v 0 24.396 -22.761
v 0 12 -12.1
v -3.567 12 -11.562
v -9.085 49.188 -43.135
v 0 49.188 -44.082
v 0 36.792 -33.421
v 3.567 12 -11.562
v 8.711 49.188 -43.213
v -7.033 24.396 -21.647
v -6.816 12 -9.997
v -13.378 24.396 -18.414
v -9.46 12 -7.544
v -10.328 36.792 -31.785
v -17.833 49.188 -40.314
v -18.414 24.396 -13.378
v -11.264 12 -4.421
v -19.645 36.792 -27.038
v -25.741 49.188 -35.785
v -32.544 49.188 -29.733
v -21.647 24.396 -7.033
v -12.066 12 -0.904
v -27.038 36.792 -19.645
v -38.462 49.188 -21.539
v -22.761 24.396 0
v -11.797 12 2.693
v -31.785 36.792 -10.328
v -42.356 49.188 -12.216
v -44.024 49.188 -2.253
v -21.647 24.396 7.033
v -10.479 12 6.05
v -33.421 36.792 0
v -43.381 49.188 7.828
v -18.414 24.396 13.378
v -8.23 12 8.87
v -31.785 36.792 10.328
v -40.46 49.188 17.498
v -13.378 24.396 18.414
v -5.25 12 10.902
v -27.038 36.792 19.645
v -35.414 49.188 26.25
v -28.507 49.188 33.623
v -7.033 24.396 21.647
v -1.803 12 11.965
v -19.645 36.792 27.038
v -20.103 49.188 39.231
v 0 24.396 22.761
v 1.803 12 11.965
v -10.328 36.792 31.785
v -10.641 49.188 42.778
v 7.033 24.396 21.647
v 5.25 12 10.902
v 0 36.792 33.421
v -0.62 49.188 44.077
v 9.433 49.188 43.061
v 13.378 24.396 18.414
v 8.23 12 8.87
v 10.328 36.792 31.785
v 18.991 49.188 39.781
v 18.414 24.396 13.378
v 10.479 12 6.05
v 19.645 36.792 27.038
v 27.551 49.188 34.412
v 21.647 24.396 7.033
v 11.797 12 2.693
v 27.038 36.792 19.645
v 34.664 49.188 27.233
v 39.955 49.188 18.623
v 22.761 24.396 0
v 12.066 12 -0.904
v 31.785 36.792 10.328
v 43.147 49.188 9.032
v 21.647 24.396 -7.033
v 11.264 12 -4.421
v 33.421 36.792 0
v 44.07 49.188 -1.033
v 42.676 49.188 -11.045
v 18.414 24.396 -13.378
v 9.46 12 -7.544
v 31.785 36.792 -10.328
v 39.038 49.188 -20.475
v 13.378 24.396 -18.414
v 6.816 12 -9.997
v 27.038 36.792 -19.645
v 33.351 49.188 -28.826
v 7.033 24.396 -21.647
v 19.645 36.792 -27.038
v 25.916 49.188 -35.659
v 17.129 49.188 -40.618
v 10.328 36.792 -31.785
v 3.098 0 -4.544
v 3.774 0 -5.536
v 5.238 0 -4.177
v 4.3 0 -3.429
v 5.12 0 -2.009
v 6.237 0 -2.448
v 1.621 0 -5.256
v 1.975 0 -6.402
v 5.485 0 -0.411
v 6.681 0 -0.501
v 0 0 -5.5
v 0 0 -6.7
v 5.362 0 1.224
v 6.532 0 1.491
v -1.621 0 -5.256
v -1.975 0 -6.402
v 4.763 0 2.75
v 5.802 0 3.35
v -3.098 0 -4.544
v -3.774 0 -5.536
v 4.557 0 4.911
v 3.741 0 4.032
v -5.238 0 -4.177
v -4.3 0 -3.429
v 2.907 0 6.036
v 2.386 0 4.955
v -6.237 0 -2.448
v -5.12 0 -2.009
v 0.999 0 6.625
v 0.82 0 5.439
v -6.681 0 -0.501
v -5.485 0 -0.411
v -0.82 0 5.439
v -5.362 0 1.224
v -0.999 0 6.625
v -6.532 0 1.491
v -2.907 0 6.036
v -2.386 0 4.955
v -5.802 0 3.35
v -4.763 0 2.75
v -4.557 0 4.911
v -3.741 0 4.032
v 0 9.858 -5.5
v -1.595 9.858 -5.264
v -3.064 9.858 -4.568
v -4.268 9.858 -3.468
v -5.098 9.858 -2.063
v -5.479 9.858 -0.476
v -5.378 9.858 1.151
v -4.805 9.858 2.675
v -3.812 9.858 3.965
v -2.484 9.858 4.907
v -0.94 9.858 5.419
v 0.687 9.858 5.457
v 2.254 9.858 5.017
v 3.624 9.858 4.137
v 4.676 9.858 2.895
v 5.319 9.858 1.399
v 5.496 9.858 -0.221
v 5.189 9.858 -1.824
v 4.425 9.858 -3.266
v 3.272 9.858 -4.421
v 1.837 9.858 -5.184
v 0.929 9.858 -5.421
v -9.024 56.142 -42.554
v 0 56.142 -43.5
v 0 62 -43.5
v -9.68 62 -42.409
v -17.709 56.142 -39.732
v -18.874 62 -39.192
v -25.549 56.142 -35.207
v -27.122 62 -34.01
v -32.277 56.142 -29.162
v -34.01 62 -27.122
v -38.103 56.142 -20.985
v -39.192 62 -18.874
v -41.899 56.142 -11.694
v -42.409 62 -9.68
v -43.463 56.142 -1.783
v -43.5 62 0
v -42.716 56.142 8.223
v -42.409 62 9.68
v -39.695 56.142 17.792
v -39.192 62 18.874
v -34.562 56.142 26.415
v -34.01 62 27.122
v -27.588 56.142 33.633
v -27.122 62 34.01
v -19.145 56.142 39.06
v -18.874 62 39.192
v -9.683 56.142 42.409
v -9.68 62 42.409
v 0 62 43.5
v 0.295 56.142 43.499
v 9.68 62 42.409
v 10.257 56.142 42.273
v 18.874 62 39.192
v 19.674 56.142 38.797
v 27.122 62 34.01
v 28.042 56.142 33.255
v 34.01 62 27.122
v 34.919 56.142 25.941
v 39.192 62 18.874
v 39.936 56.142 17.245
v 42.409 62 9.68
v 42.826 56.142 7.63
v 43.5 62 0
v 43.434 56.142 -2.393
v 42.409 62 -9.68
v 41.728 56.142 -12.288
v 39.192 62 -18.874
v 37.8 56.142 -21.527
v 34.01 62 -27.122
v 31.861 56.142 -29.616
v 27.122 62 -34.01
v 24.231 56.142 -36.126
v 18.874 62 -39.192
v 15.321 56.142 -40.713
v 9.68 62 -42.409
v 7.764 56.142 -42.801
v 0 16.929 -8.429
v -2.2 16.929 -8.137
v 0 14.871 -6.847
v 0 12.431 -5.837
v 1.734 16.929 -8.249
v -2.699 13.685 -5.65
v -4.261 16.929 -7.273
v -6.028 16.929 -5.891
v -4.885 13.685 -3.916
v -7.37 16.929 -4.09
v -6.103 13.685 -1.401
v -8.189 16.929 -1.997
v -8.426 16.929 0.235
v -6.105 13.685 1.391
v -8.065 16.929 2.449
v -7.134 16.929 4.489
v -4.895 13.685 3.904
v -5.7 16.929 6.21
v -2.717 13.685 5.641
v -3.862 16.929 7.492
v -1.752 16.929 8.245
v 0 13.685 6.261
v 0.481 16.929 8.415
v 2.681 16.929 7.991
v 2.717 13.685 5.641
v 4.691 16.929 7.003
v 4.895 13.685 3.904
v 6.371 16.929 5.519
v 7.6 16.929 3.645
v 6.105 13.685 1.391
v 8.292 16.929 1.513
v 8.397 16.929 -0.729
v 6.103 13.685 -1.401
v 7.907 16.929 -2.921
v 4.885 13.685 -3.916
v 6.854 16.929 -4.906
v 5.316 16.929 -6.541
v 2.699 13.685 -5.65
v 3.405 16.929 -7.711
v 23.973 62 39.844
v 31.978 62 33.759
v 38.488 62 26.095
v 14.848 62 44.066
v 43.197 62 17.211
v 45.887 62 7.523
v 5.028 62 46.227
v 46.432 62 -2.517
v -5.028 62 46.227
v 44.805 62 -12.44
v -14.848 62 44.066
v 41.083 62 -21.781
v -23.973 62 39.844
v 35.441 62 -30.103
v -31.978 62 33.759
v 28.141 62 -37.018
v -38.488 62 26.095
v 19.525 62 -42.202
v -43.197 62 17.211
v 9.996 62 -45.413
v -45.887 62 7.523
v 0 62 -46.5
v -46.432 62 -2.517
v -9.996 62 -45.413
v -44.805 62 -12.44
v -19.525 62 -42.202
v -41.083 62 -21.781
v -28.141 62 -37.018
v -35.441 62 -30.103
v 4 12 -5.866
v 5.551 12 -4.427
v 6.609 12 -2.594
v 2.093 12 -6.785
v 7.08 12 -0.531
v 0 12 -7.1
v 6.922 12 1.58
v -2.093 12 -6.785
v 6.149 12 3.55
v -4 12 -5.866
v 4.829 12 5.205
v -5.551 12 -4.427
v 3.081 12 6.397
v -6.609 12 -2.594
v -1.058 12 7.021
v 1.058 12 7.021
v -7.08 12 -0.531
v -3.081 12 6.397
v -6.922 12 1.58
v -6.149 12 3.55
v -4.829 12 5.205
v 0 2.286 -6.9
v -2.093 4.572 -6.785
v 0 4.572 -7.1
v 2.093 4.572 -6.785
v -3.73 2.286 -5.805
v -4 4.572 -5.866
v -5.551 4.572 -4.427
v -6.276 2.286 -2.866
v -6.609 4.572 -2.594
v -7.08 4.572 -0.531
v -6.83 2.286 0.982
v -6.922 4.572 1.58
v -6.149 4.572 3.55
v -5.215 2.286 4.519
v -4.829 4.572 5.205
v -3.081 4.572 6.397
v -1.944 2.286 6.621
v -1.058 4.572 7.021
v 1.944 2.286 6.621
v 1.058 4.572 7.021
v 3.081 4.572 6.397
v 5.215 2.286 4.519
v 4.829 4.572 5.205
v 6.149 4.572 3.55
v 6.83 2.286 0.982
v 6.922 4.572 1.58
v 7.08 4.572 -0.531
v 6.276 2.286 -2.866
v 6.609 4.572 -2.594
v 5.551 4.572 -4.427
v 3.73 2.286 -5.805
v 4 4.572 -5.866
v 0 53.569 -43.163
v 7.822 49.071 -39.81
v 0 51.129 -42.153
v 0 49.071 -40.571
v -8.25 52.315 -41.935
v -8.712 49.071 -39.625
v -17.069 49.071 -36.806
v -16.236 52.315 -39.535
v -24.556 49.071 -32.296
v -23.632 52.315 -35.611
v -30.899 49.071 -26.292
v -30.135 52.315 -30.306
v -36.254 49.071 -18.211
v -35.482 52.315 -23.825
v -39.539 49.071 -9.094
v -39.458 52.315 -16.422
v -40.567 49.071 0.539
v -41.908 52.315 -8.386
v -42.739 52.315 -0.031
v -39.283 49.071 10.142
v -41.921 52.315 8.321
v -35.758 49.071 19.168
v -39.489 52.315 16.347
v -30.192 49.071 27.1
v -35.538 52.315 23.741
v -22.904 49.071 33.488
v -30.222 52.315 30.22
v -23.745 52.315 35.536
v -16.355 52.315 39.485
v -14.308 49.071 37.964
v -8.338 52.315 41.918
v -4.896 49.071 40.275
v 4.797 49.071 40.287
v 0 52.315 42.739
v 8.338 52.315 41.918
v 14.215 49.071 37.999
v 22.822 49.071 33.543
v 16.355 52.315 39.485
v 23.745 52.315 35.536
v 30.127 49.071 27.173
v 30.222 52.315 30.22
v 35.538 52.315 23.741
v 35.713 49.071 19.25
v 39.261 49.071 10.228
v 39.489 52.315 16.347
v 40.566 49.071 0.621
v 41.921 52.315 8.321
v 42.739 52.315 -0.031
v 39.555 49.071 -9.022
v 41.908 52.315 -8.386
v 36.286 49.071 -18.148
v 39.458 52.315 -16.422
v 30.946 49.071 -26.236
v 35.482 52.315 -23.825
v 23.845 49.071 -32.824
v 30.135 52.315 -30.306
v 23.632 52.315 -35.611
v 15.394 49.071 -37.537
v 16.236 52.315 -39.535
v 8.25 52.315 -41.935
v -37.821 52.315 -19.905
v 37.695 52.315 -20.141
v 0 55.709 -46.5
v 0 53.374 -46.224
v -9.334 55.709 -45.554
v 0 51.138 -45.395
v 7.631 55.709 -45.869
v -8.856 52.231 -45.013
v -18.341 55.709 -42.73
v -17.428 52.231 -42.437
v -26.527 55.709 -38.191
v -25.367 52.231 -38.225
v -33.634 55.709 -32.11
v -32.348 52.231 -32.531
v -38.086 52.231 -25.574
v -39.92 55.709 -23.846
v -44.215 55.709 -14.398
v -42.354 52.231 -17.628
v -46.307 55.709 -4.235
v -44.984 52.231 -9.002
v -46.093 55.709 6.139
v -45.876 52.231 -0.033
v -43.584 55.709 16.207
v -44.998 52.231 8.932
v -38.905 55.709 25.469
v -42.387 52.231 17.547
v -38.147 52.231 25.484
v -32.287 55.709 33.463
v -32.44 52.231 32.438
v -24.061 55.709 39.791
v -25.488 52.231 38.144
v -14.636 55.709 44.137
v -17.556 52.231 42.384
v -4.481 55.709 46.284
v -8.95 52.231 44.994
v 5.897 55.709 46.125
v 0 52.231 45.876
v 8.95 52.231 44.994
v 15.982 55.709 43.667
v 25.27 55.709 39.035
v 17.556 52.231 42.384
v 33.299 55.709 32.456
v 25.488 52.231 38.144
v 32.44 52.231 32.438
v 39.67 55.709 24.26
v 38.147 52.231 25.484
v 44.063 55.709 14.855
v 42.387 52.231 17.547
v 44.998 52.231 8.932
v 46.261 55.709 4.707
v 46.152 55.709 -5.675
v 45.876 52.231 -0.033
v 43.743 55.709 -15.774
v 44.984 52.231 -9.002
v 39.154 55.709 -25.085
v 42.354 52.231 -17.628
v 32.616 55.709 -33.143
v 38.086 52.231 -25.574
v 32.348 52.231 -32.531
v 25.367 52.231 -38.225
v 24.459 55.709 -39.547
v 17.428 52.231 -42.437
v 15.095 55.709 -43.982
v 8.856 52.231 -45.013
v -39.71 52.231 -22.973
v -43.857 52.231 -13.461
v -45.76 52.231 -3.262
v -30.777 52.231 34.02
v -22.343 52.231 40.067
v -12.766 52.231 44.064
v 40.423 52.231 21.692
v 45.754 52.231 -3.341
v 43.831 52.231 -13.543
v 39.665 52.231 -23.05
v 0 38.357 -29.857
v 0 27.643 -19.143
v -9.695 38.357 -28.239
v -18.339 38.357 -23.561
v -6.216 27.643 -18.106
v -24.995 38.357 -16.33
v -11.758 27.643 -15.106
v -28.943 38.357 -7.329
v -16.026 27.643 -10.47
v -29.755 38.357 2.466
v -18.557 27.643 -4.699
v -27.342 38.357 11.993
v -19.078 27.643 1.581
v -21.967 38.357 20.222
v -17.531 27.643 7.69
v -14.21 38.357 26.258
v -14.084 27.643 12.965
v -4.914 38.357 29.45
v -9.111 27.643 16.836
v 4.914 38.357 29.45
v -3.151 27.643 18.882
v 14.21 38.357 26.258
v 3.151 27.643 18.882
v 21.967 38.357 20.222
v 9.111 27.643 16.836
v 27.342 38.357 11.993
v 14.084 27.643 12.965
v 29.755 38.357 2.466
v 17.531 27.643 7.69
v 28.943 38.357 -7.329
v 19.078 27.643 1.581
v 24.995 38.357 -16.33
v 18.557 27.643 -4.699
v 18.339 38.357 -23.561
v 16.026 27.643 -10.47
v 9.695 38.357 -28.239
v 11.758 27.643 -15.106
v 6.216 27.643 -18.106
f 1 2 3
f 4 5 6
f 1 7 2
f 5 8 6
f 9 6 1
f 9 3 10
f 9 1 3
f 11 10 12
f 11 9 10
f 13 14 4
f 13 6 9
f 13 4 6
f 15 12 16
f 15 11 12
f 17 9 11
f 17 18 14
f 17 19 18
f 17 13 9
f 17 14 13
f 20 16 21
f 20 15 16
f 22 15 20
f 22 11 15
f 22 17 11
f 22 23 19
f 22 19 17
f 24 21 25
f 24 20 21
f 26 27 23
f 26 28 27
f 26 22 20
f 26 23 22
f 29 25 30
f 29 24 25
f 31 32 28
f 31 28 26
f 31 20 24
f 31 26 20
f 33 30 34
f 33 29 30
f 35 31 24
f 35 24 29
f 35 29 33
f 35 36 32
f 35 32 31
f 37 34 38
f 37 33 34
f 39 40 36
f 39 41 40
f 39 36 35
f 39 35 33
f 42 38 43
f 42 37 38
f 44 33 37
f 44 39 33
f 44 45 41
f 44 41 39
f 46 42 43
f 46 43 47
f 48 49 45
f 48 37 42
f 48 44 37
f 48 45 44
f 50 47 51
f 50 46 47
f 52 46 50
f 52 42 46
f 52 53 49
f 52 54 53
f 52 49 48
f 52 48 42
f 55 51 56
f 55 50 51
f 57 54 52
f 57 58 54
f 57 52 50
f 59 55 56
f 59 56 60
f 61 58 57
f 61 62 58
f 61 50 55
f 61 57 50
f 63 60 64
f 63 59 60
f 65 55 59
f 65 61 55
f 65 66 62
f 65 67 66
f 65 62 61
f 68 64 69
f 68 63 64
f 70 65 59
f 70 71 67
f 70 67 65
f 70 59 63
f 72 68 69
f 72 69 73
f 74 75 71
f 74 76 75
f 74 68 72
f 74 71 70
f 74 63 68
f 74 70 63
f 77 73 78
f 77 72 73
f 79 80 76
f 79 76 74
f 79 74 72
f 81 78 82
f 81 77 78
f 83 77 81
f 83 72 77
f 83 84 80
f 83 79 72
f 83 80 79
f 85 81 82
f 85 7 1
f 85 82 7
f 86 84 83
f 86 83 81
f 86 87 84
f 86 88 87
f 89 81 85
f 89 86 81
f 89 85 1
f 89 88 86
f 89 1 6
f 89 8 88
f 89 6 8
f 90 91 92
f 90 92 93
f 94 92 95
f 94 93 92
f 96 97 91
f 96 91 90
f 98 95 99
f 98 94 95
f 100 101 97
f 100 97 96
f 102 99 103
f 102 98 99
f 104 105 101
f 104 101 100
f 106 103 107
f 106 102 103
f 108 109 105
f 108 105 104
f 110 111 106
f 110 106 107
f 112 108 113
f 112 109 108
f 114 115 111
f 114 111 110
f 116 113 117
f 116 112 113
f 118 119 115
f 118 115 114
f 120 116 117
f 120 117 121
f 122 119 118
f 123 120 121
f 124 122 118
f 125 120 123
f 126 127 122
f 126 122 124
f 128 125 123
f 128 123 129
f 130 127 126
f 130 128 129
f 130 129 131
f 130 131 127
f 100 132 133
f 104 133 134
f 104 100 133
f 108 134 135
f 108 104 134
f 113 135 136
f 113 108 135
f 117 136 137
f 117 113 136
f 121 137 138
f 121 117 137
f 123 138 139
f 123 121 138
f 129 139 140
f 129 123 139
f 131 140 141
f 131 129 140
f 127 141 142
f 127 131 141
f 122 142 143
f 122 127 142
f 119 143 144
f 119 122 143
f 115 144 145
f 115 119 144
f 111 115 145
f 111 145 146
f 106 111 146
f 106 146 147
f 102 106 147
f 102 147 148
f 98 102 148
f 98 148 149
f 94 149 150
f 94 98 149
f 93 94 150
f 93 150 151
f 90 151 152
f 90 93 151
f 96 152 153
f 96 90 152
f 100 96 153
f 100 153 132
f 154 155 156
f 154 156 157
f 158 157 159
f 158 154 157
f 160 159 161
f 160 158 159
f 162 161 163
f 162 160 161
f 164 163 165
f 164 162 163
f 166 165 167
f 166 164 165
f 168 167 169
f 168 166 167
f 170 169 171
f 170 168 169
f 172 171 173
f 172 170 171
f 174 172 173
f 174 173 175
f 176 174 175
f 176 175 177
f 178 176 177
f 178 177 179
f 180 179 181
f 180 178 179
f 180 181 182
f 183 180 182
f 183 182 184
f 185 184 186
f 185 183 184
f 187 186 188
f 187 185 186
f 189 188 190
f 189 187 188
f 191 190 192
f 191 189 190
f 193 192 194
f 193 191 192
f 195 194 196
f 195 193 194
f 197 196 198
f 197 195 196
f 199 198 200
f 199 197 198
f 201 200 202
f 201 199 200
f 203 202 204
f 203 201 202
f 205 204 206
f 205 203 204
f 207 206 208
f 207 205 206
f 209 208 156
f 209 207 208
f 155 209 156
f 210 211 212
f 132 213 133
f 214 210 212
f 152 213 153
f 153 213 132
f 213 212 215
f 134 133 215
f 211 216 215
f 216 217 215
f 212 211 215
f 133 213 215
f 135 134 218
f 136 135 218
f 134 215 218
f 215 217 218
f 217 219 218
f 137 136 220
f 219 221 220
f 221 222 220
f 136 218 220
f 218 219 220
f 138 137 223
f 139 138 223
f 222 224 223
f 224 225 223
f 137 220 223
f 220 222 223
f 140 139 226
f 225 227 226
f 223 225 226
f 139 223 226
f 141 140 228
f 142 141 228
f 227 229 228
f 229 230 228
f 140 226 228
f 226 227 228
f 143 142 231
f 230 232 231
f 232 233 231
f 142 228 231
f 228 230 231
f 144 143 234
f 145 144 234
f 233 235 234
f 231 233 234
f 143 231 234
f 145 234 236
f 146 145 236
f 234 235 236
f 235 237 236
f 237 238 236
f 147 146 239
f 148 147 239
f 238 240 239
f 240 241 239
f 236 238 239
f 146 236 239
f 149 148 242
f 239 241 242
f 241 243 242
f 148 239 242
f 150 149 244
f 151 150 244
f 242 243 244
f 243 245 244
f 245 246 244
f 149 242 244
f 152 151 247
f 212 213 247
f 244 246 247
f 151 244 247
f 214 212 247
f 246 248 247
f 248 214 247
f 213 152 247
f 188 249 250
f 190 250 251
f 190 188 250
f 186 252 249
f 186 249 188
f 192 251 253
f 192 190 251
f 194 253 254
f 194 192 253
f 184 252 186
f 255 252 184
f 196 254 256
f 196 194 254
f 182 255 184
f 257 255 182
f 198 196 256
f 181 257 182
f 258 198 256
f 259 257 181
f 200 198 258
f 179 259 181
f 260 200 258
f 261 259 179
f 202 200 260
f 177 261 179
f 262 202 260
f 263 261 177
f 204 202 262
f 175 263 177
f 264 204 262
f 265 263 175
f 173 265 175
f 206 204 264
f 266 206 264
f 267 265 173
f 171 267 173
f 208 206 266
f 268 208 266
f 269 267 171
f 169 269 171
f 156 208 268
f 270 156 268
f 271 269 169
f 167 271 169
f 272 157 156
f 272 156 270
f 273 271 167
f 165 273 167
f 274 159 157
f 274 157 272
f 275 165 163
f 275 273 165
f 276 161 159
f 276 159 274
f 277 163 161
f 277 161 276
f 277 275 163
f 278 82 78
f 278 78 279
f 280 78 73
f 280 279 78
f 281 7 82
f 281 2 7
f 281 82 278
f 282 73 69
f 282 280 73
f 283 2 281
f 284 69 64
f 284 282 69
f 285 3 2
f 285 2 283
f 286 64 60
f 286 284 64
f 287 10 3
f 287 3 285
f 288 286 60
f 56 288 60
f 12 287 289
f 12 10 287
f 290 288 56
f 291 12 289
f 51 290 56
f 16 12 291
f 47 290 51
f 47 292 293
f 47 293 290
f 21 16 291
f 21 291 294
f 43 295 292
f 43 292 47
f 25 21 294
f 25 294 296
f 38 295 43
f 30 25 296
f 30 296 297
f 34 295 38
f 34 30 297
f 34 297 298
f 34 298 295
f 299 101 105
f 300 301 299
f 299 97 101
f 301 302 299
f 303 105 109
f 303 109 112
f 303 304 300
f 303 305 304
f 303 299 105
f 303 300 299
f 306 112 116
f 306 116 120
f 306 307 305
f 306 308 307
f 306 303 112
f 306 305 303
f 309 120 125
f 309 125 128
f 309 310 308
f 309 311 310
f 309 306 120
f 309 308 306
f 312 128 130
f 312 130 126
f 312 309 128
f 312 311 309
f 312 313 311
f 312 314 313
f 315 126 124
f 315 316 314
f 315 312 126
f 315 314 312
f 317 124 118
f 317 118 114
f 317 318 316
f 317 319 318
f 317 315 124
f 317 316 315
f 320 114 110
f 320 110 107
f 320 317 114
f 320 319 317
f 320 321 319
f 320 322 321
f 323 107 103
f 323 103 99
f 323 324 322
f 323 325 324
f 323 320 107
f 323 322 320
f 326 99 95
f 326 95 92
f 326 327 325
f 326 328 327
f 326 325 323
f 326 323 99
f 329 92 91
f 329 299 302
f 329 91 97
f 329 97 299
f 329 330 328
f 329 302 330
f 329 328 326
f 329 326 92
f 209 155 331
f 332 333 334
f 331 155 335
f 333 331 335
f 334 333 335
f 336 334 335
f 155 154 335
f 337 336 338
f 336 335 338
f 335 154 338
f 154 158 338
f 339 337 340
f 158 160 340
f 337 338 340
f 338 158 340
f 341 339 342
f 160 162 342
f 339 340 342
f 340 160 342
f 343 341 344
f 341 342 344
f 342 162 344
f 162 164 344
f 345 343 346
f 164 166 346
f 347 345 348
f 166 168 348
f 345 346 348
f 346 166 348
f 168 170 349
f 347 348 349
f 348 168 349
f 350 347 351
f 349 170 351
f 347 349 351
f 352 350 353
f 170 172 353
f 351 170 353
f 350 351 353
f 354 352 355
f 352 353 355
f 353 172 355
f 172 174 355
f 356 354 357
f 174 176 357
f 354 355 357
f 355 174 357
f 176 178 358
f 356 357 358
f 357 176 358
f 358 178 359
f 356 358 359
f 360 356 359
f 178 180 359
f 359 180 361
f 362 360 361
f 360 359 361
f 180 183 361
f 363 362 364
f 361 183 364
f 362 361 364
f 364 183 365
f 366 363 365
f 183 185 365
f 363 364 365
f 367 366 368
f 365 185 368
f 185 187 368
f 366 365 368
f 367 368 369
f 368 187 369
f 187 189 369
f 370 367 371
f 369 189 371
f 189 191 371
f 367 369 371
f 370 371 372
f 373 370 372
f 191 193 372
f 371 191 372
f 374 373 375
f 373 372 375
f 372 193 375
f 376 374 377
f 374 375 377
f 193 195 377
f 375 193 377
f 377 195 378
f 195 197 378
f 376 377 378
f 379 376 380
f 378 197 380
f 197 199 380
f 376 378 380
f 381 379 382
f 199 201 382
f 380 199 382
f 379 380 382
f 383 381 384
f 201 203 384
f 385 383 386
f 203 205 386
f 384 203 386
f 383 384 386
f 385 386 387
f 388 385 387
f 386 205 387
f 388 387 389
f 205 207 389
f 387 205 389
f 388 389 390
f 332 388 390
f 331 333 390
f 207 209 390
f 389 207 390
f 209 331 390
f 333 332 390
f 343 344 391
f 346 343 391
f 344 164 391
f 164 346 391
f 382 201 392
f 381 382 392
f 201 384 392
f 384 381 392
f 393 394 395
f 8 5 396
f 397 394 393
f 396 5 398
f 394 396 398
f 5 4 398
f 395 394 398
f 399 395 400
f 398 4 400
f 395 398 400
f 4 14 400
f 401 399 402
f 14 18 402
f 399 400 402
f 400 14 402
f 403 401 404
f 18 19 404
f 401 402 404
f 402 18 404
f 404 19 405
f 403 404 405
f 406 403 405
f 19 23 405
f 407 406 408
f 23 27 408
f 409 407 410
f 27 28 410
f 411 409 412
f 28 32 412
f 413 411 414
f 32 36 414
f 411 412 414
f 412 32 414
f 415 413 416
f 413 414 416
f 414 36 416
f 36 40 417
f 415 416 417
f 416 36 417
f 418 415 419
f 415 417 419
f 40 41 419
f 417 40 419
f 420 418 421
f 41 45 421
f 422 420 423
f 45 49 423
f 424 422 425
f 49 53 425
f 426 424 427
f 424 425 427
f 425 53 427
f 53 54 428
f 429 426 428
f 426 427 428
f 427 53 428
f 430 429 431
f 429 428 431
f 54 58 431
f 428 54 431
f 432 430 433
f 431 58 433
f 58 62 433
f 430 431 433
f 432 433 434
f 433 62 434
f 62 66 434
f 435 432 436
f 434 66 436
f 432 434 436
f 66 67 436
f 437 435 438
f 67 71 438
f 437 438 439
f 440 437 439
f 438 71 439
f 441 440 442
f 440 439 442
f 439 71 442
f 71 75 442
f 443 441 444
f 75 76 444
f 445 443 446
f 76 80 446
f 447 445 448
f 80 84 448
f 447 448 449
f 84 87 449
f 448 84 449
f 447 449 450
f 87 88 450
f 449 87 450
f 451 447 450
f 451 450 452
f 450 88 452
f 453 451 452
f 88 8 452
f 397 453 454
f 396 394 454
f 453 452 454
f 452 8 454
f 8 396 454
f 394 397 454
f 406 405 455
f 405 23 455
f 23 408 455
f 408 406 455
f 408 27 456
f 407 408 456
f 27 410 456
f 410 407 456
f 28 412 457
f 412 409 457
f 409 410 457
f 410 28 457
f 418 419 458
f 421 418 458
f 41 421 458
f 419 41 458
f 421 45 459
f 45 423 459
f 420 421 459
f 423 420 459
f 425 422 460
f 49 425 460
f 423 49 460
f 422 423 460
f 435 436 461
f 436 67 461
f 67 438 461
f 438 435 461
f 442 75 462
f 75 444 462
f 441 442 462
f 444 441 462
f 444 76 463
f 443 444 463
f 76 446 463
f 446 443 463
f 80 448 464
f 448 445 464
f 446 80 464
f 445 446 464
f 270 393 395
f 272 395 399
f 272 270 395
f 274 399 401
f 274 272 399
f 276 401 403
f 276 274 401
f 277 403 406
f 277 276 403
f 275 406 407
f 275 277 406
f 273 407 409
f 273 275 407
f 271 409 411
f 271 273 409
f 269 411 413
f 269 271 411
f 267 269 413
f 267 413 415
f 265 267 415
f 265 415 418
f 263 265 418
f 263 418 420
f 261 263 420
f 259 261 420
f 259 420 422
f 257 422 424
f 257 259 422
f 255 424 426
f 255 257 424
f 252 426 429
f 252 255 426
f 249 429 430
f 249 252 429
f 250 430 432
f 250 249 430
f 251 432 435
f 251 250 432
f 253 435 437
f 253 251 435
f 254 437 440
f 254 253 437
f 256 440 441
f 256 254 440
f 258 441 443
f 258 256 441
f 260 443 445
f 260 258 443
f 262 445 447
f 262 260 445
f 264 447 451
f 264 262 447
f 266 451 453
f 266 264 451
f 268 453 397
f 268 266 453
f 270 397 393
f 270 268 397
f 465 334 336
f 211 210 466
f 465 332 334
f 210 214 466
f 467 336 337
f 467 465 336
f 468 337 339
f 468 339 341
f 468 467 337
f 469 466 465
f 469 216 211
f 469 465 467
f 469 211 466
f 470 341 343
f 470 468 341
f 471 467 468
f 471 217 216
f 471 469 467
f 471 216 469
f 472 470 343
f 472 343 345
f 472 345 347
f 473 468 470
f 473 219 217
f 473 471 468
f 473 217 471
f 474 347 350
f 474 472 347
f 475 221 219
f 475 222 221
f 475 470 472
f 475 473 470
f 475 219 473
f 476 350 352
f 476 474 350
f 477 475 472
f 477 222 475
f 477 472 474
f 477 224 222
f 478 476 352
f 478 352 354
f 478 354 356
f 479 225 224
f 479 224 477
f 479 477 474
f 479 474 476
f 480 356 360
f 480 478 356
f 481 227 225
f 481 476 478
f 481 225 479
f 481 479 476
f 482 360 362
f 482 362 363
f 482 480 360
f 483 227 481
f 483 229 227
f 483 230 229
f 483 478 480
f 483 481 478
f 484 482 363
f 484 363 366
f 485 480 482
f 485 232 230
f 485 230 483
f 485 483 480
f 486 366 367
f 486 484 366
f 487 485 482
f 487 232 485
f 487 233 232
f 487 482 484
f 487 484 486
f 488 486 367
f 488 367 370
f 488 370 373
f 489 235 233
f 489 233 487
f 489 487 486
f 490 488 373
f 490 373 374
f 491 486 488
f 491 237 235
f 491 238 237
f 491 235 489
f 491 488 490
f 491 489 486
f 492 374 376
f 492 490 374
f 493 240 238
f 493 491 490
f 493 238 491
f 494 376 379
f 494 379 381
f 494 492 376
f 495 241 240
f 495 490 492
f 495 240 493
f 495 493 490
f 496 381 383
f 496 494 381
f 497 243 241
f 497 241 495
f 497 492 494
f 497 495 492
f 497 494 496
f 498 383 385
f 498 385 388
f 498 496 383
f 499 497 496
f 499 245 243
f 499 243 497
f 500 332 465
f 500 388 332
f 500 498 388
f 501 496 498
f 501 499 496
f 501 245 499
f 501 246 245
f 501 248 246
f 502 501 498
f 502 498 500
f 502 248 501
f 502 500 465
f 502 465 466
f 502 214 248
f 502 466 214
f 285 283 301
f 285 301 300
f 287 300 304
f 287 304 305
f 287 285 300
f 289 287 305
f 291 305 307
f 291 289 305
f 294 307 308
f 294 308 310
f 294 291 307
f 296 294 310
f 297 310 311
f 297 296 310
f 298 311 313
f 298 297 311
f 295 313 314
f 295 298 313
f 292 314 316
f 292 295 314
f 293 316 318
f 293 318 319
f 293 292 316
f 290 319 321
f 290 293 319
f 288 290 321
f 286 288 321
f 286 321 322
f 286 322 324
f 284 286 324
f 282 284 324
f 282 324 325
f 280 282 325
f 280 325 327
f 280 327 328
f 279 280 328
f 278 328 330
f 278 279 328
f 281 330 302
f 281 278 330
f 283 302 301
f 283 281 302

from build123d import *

# Parameters (mm, degrees)
FILLET1_R      = 10
CHAMFER1_SIZE  = 0.4
CHAMFER1_SIZE2 = 4.572020921


with BuildPart() as part:
    # Sketch1 → Revolve1 (revolve)
    with BuildSketch(Plane.XY, mode=Mode.PRIVATE) as revolve1_sk:
        Polygon((5.5, 0), (7.1, 0), (7.1, 12), (12.1, 12), (46.5, 52), (46.5, 62), (43.5, 62), (43.5, 52), (5.5, 14), align=None)
    revolve(revolve1_sk.sketch.rotate(Axis((0, 0, 0), (0, 1, 0)), 90), axis=Axis((0, 0, 0), (0, 1, 0)))

    # Fillet1
    fillet1_edges = [part.edges().sort_by_distance(p)[0] for p in [
        (0, 14, 5.5),
        (0, 52, 43.5),
        (0, 52, 46.5),
    ]]
    fillet(fillet1_edges, radius=FILLET1_R)

    # Chamfer1
    chamfer1_edges = [part.edges().sort_by_distance(p)[0] for p in [
        (0, 0, 7.1),
    ]]
    chamfer1_side = [part.faces().sort_by_distance(p)[0] for p in [
        (0, 0, 5.700818326),
    ]]
    chamfer(chamfer1_edges, length=CHAMFER1_SIZE, length2=CHAMFER1_SIZE2, reference=chamfer1_side[0])


solid = part.part
